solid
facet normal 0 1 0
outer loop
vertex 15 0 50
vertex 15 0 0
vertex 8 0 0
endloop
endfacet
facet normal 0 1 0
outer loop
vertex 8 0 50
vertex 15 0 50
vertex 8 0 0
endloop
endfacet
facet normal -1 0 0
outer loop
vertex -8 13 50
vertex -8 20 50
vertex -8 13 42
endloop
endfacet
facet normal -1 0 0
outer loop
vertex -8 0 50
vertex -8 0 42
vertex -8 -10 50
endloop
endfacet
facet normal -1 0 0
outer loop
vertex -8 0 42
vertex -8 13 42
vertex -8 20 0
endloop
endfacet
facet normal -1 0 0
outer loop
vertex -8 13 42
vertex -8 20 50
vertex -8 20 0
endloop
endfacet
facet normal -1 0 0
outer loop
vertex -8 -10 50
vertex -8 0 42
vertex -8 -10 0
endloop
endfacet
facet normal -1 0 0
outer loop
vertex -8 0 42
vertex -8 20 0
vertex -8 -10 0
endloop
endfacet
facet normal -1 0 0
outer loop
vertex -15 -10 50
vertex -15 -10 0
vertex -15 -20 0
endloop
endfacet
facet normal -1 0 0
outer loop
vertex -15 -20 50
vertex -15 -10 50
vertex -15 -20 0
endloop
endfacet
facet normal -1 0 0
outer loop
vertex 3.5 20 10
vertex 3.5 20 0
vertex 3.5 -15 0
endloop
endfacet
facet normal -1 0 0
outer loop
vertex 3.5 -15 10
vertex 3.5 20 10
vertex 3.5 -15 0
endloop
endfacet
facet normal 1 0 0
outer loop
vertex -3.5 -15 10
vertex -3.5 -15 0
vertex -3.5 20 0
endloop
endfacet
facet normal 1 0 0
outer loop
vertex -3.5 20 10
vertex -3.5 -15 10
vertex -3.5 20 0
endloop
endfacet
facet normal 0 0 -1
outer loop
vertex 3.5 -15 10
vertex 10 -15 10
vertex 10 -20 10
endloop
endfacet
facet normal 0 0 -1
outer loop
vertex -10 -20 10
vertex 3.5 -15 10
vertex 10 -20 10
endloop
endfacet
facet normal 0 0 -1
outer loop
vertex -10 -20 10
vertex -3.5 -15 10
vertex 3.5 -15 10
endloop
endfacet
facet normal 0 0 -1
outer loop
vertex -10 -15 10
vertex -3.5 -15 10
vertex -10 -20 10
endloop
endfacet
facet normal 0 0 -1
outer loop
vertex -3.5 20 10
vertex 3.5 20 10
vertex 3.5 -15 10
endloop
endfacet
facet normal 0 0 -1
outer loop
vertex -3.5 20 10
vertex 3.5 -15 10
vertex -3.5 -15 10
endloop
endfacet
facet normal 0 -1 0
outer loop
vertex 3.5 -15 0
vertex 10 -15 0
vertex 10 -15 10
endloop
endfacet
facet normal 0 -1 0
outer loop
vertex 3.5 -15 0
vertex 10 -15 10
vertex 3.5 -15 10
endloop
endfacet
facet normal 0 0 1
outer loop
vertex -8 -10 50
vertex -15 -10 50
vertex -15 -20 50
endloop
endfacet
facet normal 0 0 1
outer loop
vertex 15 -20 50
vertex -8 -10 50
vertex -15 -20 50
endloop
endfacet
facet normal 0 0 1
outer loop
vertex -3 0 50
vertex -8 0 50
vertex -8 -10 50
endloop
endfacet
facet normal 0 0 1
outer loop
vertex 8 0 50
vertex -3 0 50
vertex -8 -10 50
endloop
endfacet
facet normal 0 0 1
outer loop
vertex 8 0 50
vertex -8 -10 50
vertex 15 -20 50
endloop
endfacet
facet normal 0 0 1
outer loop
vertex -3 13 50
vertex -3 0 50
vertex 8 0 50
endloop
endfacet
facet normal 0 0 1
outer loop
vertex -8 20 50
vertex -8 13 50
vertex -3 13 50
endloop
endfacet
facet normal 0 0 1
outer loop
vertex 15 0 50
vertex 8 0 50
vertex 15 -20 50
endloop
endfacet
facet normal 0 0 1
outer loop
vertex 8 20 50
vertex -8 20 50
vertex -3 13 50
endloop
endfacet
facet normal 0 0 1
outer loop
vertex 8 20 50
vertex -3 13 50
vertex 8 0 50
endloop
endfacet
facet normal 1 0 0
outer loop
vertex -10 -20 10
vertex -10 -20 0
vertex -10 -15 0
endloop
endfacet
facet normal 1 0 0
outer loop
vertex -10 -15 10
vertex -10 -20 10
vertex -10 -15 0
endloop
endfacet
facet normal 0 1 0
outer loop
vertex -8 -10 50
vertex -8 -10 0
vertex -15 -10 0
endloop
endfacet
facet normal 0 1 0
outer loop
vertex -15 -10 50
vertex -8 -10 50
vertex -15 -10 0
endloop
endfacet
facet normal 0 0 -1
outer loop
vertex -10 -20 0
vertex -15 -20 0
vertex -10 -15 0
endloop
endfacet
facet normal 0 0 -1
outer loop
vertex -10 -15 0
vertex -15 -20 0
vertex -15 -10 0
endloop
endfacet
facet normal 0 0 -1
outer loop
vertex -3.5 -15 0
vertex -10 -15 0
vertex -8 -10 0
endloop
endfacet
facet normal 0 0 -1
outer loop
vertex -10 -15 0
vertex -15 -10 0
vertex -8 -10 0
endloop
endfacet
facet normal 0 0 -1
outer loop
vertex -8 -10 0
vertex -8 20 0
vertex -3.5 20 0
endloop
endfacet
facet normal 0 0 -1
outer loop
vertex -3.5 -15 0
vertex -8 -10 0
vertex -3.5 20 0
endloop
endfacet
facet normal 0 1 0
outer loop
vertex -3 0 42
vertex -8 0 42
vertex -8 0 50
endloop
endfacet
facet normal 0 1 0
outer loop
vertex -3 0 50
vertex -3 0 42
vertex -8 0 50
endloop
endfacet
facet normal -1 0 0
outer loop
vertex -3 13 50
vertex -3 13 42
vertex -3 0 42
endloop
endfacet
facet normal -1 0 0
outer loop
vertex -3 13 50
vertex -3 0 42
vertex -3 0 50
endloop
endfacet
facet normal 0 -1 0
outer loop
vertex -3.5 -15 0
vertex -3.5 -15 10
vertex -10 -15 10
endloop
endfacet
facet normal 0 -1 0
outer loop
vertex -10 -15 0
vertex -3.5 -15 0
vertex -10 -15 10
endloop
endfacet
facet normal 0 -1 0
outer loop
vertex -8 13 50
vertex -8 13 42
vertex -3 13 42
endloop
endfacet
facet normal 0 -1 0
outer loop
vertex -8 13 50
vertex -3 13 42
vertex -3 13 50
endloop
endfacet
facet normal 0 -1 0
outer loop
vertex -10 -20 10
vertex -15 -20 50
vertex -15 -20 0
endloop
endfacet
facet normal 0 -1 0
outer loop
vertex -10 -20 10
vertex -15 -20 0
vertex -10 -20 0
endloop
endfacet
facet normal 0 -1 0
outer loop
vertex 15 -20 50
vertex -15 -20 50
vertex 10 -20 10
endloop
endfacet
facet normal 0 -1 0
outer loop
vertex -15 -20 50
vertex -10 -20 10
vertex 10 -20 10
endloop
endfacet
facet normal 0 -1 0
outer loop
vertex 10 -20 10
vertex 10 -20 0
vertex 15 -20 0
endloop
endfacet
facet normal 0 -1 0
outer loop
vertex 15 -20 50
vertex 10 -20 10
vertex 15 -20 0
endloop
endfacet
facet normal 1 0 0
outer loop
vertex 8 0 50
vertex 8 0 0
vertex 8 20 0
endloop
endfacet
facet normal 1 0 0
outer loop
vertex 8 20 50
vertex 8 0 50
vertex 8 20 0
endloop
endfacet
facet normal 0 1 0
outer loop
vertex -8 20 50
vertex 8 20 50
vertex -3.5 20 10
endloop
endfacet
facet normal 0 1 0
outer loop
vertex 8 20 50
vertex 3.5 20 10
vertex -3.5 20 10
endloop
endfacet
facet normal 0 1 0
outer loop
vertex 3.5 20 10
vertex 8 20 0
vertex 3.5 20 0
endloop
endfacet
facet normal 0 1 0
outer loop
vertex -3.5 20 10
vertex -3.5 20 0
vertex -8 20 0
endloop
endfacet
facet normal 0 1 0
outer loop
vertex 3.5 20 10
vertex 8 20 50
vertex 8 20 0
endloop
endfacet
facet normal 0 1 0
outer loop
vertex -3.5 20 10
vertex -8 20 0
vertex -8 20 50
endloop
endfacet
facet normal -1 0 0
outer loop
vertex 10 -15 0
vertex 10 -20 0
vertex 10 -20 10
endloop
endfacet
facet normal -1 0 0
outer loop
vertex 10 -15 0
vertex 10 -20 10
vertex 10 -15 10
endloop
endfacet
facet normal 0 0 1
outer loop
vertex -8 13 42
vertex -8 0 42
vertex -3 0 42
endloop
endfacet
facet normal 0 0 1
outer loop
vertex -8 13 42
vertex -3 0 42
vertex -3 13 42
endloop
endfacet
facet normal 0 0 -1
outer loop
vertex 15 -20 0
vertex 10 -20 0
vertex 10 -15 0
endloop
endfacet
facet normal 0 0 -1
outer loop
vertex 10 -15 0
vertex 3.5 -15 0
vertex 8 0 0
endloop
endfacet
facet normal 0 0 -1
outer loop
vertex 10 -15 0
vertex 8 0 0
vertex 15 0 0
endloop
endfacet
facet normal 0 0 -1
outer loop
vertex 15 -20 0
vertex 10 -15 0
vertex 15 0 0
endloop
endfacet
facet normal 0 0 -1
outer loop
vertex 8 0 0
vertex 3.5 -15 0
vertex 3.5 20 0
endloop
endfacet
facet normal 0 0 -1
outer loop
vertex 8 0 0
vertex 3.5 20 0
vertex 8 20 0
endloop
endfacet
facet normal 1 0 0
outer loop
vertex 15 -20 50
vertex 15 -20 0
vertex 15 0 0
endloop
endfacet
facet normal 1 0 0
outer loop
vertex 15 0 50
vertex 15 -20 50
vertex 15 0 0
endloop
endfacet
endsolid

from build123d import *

# Parameters (mm, degrees)
EXTRUDE_2_DEPTH     = 50
SKETCH_2_W          = 7
SKETCH_2_H          = 35
SKETCH_2_H_2        = 5
SKETCH_2_W_2        = 6.5
CUT_EXTRUDE_1_DEPTH = 10
SKETCH_3_W          = 8
SKETCH_3_H          = 13
CUT_EXTRUDE_2_DEPTH = 5


with BuildPart() as part:
    # Эскиз1 → Бобышка-Вытянуть2 (new body)
    with BuildSketch(Plane.XY):
        Polygon((8, 20), (-8, 20), (-8, -10), (-15, -10), (-15, -20), (15, -20), (15, 0), (8, 0), (8, 10), align=None)
    extrude(amount=EXTRUDE_2_DEPTH)

    # Эскиз2 → Вырез-Вытянуть1 (cut)
    with BuildSketch(Plane(origin=(0, 0, 0), x_dir=(-1, 0, 0), z_dir=(0, 0, -1))):
        with Locations((0, 2.5)):
            Rectangle(SKETCH_2_W, SKETCH_2_H)
        with Locations((0, -17.5)):
            Rectangle(SKETCH_2_W, SKETCH_2_H_2)
        with Locations((6.75, -17.5)):
            Rectangle(SKETCH_2_W_2, SKETCH_2_H_2)
        with Locations((-6.75, -17.5)):
            Rectangle(SKETCH_2_W_2, SKETCH_2_H_2)
    extrude(amount=-CUT_EXTRUDE_1_DEPTH, mode=Mode.SUBTRACT)

    # Эскиз3 → Вырез-Вытянуть2 (cut)
    with BuildSketch(Plane.ZY.offset(8)):
        with Locations((46, 6.5)):
            Rectangle(SKETCH_3_W, SKETCH_3_H)
    extrude(amount=-CUT_EXTRUDE_2_DEPTH, mode=Mode.SUBTRACT)


solid = part.part
